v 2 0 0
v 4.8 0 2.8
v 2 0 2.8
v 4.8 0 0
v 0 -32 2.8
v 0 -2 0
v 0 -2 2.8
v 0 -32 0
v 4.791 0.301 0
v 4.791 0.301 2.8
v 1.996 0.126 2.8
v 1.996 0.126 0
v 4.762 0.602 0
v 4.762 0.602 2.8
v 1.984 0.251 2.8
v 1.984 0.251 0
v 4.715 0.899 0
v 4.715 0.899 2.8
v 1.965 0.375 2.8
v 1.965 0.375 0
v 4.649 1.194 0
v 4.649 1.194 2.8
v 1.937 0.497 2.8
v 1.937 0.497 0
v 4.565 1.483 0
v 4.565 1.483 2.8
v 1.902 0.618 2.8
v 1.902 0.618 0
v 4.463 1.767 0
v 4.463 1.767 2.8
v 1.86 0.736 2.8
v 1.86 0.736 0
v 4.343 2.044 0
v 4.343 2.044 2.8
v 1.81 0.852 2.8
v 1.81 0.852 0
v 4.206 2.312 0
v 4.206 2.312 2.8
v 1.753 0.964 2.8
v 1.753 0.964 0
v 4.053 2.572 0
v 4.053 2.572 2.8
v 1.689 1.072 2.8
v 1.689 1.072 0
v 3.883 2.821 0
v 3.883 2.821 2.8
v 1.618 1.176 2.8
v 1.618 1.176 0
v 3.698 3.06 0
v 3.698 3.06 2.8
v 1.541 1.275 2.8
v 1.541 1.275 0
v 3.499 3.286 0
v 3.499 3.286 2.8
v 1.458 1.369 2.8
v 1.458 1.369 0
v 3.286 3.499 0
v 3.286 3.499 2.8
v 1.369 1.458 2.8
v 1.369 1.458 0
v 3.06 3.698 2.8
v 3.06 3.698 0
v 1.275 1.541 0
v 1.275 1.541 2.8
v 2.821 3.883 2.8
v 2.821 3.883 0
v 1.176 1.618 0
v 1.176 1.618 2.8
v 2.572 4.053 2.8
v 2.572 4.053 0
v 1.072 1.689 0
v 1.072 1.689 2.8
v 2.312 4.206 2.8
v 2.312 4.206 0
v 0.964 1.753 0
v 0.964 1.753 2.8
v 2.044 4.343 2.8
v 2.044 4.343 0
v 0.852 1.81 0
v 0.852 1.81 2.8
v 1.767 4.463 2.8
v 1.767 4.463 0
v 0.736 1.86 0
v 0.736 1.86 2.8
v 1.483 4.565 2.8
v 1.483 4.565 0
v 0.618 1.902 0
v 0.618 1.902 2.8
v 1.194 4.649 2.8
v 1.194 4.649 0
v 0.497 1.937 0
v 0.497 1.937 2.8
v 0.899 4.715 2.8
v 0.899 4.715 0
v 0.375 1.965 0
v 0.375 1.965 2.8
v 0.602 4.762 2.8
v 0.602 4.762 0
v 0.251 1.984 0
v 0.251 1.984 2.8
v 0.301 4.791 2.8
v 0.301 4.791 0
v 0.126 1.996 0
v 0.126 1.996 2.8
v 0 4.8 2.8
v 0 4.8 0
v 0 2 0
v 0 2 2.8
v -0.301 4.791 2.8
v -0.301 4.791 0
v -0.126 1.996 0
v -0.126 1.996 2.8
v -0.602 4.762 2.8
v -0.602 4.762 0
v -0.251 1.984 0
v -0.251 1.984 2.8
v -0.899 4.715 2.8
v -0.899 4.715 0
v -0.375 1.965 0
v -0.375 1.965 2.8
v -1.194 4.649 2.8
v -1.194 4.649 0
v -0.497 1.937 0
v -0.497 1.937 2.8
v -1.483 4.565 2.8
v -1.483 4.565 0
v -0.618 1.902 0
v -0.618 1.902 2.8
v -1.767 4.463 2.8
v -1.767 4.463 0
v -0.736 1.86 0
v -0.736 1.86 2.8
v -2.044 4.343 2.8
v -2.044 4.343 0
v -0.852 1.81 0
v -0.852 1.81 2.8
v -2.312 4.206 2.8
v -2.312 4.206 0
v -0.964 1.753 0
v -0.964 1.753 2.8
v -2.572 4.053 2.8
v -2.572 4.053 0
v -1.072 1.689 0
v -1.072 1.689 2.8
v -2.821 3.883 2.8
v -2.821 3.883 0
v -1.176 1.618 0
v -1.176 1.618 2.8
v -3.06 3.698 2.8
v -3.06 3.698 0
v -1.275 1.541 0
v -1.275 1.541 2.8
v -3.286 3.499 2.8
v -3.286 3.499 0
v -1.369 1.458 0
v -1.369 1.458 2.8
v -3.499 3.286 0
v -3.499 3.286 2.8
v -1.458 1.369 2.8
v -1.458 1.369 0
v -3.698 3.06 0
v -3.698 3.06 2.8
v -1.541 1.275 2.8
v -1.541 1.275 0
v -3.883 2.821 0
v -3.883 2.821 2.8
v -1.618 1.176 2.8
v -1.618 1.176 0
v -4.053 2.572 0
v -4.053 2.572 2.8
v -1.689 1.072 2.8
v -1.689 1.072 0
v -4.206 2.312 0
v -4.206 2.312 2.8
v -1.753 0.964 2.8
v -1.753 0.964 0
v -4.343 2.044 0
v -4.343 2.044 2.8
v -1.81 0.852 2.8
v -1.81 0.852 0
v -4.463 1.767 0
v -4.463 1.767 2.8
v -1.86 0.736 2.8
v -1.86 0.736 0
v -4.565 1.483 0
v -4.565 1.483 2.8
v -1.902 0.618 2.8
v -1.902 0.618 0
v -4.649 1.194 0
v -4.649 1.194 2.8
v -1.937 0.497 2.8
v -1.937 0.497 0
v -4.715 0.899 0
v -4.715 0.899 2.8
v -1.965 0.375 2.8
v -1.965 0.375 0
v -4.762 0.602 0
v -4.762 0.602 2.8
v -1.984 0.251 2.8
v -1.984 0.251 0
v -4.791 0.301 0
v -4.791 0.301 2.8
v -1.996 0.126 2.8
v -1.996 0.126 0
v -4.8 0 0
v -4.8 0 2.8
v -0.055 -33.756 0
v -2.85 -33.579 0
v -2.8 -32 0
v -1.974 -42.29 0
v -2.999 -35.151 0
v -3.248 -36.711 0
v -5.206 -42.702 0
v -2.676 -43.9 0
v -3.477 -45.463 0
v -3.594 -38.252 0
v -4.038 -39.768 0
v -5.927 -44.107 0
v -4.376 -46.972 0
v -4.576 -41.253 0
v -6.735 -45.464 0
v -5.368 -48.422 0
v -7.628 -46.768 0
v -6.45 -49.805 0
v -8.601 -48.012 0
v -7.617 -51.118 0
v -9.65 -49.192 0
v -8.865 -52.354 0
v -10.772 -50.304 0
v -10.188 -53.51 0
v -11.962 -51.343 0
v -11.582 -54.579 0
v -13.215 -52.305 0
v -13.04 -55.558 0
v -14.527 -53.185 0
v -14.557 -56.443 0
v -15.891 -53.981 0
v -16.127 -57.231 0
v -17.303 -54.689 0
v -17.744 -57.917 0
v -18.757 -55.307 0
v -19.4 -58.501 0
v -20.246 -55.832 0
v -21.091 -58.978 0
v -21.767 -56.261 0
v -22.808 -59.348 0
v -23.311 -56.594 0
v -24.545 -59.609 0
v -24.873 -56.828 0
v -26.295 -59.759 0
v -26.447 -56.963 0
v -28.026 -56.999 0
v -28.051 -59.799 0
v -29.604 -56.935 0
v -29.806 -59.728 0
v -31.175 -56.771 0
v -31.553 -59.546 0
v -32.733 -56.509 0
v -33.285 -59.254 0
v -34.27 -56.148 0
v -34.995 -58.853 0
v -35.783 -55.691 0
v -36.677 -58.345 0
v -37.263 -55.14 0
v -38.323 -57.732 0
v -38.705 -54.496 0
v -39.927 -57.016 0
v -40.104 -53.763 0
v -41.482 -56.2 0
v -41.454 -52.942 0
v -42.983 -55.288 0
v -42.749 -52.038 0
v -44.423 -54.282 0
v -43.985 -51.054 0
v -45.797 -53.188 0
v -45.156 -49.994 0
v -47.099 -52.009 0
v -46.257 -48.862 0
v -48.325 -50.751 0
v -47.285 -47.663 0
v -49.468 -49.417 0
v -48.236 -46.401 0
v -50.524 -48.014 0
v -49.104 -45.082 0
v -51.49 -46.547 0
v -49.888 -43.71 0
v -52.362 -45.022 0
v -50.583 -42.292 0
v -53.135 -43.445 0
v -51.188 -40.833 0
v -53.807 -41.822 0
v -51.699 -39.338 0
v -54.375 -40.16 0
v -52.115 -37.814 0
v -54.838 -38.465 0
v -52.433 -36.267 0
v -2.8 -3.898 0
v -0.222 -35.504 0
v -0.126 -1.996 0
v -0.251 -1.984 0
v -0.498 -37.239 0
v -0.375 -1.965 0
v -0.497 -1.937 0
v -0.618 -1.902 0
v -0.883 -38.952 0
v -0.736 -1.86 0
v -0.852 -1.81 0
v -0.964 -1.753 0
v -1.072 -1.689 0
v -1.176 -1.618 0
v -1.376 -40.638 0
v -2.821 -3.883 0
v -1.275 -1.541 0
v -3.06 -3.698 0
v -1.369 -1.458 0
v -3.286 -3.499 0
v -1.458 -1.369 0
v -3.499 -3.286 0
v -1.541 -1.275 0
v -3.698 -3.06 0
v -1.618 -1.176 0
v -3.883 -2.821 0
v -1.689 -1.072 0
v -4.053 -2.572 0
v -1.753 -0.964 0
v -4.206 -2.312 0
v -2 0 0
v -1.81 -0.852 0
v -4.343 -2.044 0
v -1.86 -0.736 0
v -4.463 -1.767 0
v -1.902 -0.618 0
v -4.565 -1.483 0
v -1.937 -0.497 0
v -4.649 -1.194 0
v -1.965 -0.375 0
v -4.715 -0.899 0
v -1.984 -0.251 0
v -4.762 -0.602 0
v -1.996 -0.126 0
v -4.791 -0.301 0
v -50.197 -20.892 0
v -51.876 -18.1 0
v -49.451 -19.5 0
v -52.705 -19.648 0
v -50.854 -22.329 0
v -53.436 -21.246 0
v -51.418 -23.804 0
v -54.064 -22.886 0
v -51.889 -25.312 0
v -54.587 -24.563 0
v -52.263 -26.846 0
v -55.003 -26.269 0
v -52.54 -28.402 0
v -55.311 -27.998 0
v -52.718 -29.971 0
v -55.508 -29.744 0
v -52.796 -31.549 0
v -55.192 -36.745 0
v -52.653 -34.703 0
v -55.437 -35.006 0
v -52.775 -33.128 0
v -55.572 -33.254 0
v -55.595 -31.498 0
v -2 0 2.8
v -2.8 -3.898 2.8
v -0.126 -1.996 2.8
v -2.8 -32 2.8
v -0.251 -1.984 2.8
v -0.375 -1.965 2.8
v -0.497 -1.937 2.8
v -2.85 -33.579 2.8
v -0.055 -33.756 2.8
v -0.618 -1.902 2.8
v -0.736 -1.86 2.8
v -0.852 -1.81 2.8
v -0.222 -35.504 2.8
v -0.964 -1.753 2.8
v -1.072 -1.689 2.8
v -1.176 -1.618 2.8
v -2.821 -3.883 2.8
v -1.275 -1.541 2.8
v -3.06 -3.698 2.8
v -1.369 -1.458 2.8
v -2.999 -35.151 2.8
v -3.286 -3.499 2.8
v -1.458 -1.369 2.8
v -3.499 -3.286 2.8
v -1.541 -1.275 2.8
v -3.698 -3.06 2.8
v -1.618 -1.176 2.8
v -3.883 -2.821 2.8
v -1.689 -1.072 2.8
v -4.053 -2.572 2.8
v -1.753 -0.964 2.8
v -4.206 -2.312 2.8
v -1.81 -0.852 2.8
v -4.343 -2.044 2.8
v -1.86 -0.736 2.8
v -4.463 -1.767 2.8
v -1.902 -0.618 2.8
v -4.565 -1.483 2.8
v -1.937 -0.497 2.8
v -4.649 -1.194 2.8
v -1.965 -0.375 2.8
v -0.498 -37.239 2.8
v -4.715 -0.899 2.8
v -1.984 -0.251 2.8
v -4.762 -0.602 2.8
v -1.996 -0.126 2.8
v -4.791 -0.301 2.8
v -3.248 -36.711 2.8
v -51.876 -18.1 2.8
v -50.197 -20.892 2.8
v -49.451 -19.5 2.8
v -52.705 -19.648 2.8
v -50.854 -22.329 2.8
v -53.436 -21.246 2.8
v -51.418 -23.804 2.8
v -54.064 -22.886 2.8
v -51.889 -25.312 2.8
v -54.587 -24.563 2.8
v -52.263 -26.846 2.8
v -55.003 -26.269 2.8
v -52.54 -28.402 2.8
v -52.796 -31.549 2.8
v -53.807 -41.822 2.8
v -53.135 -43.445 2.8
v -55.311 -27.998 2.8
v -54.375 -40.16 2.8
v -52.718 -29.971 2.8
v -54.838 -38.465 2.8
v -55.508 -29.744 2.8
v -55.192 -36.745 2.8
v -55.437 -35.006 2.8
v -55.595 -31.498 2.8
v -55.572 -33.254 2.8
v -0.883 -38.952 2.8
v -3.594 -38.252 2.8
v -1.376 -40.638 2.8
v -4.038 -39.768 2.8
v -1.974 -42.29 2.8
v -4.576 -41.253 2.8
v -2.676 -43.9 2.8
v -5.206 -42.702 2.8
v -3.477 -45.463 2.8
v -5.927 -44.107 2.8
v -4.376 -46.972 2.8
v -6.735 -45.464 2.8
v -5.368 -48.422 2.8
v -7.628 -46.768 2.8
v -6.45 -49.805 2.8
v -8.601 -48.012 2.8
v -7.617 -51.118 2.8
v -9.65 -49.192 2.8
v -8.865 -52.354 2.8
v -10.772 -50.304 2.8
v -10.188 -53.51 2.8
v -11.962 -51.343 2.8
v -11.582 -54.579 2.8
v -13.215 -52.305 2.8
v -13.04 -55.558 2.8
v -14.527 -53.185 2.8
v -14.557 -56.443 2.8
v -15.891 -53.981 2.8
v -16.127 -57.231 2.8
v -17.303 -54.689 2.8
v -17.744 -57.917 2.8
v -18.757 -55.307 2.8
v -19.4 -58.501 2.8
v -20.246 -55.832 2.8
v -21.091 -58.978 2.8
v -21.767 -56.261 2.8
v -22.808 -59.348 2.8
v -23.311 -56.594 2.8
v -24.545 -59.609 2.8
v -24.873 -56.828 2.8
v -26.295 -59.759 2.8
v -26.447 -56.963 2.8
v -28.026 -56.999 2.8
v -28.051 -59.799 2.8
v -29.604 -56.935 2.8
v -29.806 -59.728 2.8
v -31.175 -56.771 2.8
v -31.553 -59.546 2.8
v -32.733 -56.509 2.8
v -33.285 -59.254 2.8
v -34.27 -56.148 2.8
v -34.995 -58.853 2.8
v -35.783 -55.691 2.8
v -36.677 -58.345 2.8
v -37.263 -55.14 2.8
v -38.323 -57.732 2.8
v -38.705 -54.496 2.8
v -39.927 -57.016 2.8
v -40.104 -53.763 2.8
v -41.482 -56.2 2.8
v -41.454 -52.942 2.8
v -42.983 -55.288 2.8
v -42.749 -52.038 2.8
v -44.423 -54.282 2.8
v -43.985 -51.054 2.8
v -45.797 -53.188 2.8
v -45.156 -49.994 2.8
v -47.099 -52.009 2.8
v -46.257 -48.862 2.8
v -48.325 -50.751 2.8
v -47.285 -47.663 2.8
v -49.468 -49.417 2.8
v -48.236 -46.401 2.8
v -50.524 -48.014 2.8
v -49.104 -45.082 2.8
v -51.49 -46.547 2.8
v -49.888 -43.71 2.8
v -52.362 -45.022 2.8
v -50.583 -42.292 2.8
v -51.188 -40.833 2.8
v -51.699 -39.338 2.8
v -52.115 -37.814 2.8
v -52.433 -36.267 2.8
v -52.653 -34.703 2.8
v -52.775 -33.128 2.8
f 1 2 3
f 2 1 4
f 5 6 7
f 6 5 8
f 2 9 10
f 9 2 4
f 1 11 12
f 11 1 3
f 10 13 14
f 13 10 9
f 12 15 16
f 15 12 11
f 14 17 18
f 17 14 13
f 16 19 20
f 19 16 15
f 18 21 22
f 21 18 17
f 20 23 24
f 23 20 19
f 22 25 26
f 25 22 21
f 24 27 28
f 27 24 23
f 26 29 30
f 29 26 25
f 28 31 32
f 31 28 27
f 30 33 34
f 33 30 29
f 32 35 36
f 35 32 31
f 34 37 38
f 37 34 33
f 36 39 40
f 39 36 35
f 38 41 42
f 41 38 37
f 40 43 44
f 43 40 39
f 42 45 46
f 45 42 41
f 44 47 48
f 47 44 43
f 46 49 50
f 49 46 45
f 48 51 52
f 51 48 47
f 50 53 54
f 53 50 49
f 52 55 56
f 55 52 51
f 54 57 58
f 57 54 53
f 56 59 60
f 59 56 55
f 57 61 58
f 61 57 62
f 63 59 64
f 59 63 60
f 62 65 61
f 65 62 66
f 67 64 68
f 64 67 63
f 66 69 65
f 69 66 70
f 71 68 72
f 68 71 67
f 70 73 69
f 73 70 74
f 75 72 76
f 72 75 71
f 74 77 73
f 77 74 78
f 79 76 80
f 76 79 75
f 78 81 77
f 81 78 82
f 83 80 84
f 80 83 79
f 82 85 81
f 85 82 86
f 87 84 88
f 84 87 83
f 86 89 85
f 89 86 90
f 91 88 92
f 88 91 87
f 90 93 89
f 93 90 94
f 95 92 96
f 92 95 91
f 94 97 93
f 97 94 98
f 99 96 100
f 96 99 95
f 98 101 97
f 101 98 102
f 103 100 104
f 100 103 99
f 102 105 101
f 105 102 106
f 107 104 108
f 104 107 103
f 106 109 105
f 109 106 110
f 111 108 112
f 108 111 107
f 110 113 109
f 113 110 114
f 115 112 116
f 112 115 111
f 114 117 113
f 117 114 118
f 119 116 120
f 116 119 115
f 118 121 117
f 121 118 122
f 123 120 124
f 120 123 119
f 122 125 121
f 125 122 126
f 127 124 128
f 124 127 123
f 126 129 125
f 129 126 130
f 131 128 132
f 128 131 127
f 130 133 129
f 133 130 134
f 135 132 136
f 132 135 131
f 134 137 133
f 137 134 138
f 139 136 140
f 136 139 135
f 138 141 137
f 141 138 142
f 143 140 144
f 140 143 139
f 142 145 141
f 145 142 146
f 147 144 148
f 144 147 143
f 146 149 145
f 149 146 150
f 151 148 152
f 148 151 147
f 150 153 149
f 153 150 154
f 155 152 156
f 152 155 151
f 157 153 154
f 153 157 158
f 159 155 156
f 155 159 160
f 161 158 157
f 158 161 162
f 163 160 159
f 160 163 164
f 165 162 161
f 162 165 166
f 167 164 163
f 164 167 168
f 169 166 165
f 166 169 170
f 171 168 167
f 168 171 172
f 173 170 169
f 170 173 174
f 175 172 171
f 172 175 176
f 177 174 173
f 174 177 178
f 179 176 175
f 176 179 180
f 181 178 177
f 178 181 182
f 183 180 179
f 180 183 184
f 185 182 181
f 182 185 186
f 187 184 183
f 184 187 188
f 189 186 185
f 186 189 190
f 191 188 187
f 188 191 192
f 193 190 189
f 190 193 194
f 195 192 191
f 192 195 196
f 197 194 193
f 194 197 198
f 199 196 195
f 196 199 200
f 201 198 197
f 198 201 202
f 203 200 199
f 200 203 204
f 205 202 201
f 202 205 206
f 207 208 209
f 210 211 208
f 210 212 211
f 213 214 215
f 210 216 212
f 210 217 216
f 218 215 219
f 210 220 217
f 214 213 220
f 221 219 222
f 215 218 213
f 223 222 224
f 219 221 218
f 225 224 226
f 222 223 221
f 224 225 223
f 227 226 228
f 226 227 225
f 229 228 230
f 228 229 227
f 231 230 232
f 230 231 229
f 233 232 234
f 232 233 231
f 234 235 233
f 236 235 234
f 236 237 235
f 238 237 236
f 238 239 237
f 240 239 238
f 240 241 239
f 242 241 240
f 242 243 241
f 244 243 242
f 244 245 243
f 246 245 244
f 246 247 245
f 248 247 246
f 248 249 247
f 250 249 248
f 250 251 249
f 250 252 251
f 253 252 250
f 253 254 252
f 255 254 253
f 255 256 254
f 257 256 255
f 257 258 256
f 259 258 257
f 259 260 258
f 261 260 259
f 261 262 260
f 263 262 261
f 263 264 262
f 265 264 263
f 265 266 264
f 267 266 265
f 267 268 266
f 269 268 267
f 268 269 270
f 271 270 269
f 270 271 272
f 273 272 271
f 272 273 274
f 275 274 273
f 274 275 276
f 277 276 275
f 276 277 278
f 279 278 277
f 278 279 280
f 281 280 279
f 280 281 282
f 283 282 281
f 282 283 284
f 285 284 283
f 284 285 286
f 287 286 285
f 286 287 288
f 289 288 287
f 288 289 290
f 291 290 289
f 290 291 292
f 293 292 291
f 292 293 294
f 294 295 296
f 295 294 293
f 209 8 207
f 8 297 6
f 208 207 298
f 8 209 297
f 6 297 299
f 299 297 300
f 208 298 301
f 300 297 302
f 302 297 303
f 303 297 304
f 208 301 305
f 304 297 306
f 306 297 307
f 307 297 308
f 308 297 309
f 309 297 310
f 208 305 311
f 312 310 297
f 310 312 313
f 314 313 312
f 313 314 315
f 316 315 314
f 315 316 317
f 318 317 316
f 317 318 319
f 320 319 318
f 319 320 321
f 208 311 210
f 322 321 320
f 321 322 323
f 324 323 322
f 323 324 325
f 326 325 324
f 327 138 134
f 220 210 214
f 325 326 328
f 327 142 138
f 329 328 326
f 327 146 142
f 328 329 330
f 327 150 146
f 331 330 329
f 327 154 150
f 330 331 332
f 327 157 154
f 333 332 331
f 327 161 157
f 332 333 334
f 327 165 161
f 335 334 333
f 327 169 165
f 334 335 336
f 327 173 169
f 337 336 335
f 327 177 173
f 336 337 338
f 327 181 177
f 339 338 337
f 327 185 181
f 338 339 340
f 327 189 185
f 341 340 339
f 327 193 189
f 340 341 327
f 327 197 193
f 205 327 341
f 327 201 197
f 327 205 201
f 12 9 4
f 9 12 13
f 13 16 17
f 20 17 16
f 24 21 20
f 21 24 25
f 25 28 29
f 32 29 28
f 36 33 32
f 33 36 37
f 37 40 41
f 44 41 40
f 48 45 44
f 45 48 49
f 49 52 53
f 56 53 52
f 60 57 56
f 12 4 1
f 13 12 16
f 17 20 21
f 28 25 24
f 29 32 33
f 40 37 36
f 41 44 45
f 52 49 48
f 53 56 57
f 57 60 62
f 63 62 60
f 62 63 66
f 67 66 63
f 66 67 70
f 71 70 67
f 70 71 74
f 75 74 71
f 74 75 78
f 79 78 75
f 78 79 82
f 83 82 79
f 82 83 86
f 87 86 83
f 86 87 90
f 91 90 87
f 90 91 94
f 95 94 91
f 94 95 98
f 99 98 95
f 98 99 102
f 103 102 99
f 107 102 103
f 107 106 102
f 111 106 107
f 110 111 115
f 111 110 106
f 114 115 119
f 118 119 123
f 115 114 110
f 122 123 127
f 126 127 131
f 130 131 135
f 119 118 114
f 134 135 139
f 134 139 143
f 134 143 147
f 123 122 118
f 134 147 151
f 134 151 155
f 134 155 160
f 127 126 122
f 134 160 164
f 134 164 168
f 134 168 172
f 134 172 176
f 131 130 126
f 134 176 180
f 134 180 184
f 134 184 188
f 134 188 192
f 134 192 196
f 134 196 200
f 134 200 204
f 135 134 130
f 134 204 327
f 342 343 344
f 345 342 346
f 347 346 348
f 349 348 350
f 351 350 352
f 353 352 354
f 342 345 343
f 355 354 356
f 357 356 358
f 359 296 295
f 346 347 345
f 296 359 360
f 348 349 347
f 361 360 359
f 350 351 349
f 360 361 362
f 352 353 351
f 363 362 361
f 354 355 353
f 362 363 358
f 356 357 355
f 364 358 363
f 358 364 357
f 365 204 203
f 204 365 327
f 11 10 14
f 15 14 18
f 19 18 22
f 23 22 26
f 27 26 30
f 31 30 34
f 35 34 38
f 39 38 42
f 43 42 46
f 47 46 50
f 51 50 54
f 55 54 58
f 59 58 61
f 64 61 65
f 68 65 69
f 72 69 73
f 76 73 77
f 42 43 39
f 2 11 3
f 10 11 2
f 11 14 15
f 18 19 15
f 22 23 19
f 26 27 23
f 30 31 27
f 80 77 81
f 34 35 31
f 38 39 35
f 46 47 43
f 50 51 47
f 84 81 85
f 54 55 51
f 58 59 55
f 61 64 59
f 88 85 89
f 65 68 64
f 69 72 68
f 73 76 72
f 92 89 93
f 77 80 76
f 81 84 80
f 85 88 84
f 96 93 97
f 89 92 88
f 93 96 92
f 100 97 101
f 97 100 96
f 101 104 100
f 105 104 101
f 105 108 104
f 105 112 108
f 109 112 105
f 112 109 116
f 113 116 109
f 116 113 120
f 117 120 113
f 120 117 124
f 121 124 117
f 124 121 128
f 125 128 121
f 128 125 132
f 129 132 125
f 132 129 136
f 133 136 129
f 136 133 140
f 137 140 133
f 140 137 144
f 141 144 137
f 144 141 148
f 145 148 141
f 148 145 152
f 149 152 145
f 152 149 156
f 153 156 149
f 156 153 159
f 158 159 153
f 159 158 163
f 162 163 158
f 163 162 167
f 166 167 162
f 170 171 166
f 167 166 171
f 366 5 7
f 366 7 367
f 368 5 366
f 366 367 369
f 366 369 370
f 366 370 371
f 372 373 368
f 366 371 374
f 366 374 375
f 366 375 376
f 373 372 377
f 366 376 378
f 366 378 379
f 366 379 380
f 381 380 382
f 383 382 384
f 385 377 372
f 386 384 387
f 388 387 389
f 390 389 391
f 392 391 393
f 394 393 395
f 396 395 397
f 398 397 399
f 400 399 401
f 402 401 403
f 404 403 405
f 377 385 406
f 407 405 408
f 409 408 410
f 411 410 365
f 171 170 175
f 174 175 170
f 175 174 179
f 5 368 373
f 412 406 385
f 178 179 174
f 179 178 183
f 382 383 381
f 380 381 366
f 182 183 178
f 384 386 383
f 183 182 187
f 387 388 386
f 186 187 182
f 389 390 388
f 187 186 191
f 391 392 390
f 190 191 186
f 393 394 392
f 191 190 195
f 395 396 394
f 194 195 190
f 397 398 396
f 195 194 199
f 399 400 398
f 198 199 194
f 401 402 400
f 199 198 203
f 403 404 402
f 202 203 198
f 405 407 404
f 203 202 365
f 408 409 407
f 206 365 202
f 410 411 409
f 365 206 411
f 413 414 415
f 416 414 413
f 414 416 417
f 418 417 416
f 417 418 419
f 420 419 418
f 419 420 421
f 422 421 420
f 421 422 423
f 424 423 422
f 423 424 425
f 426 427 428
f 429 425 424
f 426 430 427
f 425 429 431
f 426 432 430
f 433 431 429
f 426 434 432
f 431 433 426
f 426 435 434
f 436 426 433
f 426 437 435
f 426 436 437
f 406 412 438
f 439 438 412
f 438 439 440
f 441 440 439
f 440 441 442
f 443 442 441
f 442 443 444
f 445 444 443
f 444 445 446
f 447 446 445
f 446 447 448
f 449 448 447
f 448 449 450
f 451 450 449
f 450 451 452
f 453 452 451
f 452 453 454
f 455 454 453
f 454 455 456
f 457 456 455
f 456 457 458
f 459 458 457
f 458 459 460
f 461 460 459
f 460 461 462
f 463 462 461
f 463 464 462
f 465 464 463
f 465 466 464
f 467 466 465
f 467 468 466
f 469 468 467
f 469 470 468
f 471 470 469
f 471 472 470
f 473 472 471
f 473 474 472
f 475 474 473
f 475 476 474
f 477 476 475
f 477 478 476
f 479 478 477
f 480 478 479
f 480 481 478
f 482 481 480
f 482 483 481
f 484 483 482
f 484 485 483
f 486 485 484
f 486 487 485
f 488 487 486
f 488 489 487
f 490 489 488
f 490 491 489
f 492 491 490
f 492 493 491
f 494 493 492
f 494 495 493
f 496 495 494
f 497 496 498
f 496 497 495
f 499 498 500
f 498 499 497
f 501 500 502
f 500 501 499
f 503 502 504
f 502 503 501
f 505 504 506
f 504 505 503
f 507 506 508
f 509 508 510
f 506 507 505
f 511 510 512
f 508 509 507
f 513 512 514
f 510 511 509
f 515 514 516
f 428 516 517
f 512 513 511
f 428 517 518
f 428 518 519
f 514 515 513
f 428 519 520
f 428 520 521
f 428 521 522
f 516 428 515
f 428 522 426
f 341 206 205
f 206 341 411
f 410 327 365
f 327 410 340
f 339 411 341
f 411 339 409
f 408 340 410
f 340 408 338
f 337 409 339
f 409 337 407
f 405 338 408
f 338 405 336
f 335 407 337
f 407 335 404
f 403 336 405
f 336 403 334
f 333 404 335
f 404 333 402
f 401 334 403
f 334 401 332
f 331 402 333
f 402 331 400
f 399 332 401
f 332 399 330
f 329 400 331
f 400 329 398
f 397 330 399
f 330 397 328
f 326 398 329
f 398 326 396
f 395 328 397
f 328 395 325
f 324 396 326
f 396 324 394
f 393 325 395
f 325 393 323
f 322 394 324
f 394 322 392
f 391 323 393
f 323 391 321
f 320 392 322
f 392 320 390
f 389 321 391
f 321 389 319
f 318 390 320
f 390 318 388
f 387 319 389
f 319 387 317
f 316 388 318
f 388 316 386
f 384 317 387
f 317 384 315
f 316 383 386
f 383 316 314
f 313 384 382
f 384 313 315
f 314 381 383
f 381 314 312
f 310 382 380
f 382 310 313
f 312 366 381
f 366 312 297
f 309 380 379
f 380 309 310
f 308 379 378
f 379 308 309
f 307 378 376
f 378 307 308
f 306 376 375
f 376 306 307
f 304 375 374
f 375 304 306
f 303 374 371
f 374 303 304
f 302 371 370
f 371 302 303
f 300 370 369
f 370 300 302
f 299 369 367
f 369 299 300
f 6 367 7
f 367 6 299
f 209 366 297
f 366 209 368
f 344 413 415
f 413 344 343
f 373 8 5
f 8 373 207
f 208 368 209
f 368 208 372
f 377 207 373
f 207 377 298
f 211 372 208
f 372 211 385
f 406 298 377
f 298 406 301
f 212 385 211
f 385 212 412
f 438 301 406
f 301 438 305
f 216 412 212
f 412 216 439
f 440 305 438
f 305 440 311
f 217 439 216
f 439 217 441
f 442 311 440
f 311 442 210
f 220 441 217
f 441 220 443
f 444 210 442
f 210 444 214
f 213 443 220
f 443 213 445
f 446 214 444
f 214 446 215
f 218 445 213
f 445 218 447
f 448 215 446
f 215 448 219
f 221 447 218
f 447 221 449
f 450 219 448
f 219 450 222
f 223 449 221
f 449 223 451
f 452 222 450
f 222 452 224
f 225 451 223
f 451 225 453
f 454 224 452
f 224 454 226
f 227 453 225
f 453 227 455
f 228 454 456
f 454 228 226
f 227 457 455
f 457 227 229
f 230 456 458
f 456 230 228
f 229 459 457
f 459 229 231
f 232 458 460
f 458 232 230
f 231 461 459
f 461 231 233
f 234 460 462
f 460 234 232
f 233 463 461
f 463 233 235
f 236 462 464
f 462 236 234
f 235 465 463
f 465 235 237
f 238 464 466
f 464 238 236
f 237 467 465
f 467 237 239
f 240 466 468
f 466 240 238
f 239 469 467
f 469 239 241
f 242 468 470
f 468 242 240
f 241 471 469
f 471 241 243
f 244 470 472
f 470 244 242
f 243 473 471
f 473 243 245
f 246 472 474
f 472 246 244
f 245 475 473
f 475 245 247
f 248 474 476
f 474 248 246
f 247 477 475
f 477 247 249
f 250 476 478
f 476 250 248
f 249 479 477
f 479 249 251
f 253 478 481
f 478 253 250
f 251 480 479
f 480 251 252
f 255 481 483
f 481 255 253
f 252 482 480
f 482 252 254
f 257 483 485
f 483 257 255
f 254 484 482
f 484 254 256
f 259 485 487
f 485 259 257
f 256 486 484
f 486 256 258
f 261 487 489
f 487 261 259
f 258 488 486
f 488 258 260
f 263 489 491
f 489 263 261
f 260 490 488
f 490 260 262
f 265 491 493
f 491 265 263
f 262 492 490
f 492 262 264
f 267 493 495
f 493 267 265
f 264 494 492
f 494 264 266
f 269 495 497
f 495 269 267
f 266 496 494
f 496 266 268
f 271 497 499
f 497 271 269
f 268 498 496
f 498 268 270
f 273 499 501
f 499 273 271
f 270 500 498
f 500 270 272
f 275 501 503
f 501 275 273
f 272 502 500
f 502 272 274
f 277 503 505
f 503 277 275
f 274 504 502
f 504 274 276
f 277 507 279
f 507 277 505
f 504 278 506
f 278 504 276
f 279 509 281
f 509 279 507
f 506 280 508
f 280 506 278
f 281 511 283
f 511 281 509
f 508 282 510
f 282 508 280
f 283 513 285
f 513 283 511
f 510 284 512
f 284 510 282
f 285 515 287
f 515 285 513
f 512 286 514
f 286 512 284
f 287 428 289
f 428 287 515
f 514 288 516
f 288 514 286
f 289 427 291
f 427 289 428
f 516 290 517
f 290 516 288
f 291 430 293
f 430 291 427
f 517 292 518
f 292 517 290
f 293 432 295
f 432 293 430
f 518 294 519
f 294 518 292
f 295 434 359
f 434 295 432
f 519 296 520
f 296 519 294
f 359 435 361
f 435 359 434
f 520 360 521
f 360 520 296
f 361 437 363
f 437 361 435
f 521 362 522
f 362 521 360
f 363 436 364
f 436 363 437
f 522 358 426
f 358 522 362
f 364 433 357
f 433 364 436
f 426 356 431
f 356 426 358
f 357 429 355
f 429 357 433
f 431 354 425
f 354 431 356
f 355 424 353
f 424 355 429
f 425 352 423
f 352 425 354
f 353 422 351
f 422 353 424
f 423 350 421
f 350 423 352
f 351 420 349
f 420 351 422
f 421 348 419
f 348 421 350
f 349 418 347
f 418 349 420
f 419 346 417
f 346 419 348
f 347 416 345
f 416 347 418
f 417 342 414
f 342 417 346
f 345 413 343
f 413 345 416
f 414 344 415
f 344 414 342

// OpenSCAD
smoothness = 100;

hole = 4 / 2;
thick = 0.4 * 7;
width = 0.28 * 10;
height = 30;
radius = 25;

rotate_extrude(angle=270, $fn=smoothness)
    translate([hole,0,0])
        square([thick,width]);

translate([-thick,0,0])
    rotate([0,0,270])
        translate([hole,0,0])
            cube([30,thick,width]);

translate([-(radius+thick),-(hole+height),0])
rotate_extrude(angle=-210, $fn=smoothness)
    translate([radius,0,0])
        square([thick,width]);
